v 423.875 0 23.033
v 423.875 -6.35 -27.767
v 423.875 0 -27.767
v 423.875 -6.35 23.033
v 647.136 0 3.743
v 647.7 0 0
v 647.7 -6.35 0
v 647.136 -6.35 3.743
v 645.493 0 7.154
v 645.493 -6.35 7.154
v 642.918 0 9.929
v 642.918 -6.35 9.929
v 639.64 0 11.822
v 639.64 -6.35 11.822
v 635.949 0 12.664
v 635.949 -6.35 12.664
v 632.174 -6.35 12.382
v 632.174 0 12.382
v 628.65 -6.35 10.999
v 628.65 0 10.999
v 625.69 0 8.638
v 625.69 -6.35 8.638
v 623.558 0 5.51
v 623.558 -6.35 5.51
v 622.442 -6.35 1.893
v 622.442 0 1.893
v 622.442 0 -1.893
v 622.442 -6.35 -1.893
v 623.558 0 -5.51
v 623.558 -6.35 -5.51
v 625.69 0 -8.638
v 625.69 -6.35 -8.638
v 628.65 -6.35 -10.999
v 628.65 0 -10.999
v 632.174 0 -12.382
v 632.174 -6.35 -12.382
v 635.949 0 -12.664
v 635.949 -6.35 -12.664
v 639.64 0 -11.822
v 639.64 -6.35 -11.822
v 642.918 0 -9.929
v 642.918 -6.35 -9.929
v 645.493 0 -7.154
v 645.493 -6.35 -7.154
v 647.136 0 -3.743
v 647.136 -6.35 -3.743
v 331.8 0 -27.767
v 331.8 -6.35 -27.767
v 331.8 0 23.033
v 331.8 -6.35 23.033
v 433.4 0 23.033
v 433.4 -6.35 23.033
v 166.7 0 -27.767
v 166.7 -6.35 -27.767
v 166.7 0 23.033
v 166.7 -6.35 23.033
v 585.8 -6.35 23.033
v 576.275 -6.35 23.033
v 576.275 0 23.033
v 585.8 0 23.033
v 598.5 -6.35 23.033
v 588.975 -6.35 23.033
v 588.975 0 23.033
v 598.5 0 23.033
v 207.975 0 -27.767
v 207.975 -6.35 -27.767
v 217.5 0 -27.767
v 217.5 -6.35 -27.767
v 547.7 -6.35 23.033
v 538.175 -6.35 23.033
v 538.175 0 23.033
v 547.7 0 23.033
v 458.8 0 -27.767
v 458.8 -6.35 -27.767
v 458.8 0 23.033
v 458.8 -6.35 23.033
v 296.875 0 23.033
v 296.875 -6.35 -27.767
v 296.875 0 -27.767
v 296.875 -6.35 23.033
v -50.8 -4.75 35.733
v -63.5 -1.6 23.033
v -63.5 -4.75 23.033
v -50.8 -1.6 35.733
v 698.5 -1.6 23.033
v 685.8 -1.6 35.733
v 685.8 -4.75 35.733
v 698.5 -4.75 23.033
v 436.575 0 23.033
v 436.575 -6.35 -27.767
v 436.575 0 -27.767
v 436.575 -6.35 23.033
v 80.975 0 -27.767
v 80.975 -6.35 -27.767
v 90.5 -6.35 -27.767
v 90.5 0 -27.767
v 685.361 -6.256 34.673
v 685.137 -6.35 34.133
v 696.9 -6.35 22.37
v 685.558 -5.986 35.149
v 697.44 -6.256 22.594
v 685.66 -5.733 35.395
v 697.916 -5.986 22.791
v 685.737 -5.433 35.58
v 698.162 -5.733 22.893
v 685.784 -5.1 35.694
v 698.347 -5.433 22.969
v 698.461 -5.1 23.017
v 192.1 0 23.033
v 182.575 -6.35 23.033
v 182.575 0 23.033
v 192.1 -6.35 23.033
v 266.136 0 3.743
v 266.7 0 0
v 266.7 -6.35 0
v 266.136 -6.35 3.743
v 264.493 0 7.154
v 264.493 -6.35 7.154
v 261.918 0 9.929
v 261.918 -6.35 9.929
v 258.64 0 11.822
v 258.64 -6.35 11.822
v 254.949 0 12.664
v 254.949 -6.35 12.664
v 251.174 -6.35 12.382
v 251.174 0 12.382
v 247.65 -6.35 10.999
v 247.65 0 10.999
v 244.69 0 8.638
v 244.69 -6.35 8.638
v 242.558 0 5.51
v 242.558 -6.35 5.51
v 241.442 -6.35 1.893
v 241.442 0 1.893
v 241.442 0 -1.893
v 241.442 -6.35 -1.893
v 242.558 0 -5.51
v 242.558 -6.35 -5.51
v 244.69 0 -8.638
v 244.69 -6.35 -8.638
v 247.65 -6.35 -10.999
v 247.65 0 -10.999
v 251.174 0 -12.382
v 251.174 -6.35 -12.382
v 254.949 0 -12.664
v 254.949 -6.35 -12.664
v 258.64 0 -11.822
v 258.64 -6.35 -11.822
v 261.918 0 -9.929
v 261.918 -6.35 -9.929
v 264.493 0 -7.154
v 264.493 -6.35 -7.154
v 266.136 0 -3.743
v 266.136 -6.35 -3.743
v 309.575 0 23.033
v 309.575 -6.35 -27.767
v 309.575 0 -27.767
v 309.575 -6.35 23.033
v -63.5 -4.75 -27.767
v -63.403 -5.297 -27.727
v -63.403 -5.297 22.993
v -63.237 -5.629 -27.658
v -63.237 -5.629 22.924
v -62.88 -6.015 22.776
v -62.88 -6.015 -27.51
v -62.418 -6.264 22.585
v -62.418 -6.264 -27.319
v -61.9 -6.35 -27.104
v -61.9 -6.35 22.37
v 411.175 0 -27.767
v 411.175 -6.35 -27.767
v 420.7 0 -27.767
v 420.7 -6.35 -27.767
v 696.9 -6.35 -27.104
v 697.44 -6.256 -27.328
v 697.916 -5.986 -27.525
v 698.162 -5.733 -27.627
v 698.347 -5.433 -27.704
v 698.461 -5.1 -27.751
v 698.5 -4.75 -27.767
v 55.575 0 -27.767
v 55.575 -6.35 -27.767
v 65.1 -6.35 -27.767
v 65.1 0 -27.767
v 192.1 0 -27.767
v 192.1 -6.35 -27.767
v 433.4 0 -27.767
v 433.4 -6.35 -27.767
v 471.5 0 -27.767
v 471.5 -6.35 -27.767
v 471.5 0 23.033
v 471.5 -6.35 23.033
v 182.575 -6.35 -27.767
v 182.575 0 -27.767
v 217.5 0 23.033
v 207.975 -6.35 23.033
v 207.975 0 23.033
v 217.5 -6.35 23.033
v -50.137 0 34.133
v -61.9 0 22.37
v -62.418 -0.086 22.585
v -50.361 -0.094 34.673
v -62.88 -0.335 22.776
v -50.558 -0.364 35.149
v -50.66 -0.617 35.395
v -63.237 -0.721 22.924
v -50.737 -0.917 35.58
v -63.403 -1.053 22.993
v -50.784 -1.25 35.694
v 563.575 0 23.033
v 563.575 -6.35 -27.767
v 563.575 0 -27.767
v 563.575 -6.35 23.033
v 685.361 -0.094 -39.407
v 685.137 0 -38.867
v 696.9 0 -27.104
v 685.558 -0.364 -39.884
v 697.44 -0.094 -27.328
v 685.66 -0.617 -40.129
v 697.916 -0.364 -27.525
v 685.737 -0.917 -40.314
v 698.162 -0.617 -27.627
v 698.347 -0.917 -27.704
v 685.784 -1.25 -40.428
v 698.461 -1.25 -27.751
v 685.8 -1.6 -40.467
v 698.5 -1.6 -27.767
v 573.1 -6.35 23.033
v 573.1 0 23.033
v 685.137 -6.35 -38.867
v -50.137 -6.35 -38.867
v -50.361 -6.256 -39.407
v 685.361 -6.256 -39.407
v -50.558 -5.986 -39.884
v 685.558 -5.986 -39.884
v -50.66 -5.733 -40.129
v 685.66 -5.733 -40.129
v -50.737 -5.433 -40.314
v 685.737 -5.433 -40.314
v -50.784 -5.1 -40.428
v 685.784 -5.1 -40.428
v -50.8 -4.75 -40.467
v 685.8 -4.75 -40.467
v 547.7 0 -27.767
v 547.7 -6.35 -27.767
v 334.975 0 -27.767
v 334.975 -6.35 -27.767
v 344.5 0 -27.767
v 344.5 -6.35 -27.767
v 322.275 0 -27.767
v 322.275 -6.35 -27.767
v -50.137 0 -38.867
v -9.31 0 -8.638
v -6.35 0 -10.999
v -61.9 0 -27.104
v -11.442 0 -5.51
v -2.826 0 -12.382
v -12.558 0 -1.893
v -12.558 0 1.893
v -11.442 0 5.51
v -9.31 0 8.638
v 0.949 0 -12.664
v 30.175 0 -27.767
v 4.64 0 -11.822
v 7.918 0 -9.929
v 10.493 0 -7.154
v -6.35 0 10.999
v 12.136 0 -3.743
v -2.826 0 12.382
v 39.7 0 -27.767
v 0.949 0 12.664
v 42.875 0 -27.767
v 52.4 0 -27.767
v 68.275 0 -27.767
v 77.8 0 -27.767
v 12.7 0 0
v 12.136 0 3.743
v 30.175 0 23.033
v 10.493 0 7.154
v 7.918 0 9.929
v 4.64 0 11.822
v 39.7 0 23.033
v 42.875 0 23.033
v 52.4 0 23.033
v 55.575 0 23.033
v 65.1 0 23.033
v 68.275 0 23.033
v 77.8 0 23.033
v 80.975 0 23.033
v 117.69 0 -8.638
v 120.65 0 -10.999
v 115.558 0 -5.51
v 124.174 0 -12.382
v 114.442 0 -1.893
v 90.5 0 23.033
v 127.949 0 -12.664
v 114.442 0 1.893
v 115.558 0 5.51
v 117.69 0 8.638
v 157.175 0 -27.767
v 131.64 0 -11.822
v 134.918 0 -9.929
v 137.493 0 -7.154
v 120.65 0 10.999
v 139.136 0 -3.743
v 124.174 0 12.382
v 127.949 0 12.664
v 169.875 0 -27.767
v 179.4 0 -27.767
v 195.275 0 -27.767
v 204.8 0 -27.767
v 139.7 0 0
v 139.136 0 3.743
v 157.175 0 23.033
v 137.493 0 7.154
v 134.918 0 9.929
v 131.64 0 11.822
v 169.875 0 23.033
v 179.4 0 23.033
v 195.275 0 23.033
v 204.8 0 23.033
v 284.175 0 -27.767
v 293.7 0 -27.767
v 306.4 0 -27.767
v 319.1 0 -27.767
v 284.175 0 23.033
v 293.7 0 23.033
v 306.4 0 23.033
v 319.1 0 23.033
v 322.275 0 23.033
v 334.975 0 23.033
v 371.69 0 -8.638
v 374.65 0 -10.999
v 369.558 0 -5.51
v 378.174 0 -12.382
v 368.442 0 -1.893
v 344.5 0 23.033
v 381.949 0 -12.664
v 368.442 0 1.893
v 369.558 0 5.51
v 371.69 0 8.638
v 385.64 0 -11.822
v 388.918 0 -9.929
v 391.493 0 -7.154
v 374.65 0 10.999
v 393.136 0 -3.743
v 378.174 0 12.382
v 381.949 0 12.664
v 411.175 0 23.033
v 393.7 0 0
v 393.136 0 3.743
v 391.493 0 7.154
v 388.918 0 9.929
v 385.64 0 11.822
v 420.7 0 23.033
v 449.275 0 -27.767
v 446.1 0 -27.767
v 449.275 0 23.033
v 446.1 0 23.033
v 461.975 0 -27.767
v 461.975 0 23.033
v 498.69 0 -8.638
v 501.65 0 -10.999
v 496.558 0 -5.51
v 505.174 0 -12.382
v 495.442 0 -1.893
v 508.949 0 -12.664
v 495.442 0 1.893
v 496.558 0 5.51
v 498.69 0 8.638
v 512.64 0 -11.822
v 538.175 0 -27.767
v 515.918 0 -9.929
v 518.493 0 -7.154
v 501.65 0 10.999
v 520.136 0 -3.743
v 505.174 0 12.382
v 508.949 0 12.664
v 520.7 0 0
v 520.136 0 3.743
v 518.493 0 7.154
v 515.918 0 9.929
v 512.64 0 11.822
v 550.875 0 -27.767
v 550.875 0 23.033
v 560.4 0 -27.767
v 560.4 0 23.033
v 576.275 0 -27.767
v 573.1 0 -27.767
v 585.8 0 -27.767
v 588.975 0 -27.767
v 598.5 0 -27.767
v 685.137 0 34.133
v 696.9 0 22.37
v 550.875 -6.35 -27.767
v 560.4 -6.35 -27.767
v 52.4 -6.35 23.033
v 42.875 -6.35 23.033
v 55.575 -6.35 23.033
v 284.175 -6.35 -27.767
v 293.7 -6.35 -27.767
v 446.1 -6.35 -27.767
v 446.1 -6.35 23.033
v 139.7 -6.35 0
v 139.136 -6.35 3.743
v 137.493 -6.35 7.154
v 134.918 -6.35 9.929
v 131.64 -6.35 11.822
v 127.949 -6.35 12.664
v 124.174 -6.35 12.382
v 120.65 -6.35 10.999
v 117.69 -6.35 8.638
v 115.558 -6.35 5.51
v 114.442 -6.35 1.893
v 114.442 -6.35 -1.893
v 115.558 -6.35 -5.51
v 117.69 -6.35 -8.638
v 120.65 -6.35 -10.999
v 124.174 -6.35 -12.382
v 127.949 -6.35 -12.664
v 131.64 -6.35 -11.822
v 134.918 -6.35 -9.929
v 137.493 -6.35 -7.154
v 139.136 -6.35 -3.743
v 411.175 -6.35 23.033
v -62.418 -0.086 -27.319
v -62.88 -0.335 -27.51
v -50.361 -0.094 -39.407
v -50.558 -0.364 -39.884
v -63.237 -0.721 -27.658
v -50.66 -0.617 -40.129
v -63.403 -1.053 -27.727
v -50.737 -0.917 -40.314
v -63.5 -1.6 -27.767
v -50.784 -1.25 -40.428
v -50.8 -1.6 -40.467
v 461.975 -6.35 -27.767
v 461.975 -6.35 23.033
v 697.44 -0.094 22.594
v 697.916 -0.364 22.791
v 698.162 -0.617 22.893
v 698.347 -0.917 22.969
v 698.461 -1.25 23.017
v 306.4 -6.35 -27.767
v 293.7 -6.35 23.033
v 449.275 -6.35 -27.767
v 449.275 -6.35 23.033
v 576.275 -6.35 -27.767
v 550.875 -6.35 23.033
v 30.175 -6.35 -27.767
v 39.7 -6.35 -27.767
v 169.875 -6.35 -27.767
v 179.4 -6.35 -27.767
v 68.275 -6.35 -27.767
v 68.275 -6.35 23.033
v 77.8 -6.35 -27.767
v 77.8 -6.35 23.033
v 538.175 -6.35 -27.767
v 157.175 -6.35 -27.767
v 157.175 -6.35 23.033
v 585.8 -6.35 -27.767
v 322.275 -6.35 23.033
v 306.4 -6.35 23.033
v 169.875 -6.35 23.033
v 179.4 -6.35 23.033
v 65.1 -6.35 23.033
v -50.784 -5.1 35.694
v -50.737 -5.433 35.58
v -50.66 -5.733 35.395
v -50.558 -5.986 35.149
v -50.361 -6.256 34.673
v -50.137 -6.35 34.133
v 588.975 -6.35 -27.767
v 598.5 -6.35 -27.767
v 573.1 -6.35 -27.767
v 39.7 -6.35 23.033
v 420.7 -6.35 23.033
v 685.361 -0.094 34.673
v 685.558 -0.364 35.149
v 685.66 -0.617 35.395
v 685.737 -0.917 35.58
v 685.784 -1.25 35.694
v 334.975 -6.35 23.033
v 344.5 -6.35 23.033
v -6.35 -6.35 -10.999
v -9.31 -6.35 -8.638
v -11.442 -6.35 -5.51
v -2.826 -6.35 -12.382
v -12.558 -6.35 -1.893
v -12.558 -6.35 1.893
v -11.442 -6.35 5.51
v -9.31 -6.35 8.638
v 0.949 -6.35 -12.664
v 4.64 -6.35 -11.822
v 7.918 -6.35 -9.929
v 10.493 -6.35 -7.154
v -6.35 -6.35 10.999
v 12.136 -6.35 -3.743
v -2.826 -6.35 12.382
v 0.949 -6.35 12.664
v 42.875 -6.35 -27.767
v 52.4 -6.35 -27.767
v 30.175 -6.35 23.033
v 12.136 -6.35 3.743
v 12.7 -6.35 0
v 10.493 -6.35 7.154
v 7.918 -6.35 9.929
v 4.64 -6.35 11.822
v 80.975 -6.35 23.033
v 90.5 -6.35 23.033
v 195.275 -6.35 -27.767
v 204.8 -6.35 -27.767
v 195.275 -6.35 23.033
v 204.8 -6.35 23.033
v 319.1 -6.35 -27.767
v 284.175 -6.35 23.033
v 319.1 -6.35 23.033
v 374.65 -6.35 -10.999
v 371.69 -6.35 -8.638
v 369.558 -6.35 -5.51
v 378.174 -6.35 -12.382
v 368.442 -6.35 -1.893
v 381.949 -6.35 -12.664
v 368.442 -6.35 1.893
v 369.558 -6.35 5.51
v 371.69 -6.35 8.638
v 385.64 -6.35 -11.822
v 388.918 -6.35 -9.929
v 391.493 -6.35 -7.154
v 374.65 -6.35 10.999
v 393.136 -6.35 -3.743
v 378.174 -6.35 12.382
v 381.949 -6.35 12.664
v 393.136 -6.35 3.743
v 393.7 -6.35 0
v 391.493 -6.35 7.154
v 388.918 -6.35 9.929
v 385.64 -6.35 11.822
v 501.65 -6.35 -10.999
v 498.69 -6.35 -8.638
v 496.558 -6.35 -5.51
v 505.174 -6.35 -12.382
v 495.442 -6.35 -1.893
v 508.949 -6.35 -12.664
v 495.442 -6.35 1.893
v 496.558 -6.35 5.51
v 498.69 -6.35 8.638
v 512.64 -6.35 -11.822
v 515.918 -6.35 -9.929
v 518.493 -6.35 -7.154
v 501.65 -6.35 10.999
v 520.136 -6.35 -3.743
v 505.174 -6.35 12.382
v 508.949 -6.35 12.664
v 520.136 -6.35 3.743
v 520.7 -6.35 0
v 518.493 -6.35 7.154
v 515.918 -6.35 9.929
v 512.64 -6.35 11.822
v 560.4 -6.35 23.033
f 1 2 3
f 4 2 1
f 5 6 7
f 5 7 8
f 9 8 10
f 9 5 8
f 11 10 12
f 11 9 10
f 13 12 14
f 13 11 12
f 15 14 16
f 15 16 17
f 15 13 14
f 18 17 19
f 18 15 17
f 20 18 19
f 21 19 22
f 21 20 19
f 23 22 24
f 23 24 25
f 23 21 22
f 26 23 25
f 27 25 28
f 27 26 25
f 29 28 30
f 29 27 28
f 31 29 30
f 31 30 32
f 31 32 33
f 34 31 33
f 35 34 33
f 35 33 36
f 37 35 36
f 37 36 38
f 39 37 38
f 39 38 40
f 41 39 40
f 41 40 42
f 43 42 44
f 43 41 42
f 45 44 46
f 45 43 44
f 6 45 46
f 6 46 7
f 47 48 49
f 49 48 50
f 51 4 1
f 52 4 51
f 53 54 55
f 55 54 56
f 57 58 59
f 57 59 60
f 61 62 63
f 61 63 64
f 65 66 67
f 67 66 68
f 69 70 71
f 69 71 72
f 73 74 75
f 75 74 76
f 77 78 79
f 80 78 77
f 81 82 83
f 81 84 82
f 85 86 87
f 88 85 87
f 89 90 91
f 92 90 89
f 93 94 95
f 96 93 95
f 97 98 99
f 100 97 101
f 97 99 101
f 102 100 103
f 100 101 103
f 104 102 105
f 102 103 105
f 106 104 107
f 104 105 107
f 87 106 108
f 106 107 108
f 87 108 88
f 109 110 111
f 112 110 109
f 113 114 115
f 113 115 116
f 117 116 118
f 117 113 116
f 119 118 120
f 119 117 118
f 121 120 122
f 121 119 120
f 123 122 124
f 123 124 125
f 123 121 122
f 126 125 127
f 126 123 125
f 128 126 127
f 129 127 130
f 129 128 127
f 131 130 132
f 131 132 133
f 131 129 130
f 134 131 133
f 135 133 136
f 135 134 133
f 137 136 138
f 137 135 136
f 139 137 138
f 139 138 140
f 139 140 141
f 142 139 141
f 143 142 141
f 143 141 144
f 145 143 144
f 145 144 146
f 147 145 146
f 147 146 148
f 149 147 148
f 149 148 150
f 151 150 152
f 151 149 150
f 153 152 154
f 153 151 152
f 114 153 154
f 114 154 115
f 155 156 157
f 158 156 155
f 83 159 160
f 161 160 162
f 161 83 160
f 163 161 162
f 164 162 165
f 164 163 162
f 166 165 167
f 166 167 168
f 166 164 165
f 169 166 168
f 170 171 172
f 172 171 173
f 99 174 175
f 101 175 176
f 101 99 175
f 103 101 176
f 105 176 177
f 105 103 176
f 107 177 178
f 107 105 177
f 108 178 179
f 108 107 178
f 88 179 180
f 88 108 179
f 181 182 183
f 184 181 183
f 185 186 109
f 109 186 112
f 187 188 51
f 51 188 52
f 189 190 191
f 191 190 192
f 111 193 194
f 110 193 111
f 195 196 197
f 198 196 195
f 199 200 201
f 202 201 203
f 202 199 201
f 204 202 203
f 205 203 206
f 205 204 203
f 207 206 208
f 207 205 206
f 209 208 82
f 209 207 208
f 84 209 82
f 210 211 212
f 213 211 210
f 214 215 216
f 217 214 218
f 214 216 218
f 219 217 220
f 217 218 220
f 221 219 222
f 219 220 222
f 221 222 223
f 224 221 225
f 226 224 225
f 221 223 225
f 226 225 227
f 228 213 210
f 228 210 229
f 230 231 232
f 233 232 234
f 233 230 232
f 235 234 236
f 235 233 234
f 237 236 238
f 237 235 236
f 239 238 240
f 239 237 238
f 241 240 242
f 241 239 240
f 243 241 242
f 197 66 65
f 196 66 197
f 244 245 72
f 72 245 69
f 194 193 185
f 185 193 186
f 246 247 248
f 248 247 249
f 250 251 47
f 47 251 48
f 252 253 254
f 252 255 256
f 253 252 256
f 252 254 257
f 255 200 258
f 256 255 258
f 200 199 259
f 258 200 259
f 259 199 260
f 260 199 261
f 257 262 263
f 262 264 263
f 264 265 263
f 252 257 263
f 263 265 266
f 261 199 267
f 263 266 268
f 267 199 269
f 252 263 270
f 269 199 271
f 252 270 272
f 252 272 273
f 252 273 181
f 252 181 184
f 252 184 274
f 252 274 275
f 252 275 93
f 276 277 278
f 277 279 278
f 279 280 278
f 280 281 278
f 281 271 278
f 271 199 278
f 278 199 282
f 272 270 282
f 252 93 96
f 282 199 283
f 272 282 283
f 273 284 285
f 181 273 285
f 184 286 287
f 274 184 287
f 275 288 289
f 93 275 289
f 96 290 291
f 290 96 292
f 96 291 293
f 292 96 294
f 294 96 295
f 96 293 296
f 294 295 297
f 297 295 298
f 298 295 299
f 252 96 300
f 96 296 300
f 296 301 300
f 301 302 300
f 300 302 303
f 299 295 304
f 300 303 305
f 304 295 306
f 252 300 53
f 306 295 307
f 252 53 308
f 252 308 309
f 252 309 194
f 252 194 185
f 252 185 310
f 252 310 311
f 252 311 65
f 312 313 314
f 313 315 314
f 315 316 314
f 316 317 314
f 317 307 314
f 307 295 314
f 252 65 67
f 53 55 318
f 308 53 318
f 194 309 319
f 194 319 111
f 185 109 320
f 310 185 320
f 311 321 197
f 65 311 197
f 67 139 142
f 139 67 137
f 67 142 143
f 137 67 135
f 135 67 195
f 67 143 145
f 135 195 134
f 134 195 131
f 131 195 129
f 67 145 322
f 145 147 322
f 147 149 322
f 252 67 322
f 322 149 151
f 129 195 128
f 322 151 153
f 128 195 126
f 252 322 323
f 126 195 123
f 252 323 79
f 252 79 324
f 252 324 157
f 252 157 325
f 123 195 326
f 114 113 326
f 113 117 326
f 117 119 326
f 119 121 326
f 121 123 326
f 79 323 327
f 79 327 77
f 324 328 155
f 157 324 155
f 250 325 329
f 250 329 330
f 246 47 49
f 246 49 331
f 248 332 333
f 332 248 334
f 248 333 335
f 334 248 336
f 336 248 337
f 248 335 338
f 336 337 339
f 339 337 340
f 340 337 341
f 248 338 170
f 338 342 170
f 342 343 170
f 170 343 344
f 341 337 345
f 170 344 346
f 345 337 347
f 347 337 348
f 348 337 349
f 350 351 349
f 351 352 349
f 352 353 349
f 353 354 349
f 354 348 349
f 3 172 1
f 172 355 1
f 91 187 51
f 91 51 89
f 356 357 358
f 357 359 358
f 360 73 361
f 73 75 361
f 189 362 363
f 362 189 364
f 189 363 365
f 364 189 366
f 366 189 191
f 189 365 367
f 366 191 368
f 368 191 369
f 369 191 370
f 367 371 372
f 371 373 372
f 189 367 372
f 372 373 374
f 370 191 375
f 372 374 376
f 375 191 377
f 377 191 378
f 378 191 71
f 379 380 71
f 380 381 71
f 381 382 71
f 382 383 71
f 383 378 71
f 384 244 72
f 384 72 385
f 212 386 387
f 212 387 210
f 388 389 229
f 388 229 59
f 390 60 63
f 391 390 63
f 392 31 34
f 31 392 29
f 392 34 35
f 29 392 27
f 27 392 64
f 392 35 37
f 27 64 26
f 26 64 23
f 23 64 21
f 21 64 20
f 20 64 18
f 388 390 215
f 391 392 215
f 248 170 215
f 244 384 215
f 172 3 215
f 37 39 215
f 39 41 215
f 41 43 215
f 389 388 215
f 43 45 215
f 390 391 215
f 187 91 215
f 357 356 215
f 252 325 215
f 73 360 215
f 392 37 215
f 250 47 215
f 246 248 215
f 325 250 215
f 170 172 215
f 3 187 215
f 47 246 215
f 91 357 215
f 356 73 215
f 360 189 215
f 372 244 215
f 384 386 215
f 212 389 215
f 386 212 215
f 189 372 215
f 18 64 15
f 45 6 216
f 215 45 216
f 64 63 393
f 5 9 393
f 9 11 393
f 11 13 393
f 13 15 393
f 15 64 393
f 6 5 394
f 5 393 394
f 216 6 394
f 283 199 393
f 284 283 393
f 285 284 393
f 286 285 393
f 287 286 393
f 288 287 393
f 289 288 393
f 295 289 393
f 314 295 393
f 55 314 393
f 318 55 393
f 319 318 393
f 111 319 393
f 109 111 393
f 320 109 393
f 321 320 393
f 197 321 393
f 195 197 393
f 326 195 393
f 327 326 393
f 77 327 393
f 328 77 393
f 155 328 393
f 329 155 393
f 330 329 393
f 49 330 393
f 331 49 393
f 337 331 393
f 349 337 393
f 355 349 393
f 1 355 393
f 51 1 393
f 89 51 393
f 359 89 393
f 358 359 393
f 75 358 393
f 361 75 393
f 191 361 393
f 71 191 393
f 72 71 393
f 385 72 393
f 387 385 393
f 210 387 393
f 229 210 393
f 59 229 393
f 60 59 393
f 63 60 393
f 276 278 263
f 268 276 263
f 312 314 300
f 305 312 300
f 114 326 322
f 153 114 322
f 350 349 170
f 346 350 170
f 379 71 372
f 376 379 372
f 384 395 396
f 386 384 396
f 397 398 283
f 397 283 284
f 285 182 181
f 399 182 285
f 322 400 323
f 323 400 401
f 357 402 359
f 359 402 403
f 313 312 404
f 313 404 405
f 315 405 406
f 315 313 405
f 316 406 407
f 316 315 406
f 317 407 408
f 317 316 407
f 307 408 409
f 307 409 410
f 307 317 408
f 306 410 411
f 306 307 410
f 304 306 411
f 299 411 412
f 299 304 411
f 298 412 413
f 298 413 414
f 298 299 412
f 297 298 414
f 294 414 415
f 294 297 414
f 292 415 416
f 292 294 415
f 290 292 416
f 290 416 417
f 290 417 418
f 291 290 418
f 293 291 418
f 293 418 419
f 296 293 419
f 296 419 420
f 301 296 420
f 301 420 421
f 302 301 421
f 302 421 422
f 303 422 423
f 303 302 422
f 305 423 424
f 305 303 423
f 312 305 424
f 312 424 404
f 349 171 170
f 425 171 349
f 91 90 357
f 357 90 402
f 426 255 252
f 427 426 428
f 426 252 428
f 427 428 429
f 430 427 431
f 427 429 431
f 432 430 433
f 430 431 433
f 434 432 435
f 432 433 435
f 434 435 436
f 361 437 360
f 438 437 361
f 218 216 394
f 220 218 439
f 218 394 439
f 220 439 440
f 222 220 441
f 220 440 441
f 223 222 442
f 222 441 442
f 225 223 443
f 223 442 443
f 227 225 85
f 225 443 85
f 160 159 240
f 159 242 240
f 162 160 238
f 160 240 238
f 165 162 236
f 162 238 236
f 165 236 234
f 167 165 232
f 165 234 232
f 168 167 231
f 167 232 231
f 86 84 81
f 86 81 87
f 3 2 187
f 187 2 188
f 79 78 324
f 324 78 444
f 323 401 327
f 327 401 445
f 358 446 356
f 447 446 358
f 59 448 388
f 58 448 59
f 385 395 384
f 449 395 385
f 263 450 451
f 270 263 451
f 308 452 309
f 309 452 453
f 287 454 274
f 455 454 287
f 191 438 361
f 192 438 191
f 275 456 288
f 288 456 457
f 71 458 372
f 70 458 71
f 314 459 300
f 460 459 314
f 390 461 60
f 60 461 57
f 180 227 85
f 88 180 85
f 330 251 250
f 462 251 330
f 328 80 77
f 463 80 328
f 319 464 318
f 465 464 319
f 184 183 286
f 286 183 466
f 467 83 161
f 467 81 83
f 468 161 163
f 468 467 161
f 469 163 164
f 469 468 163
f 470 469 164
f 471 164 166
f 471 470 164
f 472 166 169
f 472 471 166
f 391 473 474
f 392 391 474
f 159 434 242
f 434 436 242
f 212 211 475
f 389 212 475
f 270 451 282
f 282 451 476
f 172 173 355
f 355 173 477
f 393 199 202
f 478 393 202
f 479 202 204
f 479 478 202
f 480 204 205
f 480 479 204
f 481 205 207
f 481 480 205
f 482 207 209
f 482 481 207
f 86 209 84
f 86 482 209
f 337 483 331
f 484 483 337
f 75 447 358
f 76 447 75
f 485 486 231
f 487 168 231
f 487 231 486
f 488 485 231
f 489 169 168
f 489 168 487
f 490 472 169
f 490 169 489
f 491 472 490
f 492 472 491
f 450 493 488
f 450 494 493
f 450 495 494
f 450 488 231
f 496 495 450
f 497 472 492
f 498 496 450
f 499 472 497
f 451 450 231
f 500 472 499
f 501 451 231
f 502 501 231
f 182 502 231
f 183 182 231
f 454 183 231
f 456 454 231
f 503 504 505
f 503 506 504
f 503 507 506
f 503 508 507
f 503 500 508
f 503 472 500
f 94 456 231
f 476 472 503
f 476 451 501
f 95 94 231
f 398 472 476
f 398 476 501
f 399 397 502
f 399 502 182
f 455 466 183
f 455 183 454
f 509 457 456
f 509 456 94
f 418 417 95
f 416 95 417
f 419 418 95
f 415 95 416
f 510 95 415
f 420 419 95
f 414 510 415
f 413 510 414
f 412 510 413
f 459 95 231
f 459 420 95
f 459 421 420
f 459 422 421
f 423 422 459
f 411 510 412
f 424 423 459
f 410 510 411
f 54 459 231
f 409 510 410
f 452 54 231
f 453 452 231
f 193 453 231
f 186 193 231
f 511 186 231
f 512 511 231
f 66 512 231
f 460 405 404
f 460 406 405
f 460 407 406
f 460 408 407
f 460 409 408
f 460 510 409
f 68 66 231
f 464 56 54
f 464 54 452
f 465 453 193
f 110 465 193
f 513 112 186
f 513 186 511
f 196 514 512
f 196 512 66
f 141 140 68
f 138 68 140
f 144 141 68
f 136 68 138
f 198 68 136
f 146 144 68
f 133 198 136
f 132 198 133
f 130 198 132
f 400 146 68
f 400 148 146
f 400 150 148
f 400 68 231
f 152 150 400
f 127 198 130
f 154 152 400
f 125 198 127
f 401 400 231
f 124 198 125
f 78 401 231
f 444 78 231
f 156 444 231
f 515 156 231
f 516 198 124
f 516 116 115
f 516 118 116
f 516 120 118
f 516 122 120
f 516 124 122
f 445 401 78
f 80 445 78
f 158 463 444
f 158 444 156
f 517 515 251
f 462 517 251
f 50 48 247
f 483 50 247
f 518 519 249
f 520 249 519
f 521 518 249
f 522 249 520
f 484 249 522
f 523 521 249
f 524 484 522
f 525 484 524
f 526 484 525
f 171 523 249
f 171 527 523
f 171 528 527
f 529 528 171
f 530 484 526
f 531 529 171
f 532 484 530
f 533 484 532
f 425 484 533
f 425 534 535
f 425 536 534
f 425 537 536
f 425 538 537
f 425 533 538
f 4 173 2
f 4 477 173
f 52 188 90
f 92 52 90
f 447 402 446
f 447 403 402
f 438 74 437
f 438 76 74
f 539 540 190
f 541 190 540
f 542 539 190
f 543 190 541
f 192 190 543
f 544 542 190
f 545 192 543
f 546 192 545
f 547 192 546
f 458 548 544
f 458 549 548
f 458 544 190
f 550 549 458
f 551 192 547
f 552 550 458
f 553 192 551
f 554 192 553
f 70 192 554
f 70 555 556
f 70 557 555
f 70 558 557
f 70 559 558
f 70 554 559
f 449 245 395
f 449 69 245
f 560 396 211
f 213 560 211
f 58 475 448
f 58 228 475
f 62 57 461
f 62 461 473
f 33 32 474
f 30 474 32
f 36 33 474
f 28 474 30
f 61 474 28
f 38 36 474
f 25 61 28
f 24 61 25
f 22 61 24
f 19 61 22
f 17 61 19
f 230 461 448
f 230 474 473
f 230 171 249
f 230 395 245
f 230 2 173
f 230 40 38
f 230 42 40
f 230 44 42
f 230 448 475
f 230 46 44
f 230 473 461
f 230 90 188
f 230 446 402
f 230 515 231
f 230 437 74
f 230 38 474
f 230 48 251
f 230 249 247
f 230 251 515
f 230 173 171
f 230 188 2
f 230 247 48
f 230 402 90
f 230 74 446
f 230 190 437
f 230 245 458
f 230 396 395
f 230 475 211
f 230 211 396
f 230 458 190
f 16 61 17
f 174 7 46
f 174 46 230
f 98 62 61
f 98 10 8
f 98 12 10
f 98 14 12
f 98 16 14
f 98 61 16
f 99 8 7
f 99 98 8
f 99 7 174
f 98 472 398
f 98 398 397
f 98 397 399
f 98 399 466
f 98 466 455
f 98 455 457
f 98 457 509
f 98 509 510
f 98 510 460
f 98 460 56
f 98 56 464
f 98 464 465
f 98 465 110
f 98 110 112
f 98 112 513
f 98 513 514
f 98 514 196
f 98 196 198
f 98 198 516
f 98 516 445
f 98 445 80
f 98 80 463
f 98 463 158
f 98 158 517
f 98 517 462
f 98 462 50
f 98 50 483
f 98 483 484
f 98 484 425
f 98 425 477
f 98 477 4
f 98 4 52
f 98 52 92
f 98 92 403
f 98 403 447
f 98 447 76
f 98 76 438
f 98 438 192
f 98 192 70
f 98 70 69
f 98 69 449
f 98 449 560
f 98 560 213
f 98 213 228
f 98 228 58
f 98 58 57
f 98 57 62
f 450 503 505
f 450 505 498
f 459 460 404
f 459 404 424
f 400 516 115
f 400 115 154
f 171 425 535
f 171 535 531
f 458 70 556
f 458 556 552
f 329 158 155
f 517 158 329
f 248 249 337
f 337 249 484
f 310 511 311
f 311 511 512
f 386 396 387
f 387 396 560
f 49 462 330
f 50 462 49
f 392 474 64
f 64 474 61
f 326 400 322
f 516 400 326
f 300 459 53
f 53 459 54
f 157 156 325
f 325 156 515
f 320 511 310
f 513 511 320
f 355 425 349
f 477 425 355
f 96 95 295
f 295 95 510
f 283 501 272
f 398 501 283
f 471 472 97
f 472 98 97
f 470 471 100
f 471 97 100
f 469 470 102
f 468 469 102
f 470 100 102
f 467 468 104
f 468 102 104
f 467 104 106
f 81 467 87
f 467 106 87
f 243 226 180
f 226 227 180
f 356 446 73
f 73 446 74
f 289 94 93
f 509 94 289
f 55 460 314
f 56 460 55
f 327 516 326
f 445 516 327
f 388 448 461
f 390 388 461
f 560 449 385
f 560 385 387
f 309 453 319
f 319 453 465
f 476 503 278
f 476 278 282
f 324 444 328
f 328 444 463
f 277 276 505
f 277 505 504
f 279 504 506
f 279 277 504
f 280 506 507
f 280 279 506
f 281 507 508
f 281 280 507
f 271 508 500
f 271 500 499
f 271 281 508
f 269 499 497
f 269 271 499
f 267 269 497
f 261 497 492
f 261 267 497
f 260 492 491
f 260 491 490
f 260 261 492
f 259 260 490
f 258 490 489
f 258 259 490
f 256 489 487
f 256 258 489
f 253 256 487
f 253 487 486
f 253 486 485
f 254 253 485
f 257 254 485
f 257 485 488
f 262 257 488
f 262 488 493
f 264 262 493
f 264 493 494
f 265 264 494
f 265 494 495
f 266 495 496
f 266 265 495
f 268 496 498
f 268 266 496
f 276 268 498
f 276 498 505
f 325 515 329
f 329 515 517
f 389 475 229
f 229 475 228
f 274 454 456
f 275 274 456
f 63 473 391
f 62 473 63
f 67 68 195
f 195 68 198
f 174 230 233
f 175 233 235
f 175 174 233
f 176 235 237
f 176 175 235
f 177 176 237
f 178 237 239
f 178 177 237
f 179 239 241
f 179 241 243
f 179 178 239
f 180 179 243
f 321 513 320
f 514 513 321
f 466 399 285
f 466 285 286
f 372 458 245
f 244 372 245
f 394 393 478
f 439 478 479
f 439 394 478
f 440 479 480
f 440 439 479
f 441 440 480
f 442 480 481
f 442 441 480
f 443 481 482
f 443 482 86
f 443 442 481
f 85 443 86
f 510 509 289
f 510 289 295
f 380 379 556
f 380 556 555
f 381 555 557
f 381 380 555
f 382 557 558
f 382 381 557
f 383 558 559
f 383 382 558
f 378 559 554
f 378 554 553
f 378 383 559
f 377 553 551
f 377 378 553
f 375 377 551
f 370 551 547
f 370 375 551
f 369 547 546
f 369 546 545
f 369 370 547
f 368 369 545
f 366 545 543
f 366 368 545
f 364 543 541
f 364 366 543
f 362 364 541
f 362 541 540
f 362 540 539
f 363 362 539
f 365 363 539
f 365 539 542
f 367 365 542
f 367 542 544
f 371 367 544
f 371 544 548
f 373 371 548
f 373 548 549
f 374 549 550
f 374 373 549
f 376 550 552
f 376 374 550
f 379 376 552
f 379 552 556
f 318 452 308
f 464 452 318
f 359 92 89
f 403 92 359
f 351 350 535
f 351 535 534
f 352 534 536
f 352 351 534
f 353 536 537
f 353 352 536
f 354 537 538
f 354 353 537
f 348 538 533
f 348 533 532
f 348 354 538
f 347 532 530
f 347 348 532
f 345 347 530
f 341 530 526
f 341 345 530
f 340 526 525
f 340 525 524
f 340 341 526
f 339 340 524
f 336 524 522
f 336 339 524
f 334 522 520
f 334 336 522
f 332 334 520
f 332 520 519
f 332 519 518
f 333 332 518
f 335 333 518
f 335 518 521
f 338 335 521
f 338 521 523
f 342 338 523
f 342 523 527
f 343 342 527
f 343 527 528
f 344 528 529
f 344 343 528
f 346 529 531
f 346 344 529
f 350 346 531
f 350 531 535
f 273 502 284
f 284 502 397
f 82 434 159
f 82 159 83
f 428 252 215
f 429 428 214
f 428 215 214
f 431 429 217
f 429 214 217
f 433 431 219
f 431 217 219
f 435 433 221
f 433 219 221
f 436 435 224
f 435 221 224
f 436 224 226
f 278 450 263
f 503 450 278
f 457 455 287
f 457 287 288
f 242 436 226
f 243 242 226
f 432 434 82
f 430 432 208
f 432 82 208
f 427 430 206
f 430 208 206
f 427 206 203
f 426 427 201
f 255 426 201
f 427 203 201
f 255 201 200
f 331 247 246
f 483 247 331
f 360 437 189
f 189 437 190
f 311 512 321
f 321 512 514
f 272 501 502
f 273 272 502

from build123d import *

# Parameters (mm, degrees)
F0_W     = 762
F0_H     = 76.2
F0_R     = 12.7
F1_DEPTH = 6.35
F2_W     = 9.525
F2_H     = 50.8
F3_DEPTH = 6.351
F4_SIZE  = 12.7
F5_R     = 1.6002


with BuildPart() as f1:
    # F0 (on Front) → F1 (new body)
    with BuildSketch(Plane.XZ):
        with Locations((317.5, -2.3671598174)):
            Rectangle(F0_W, F0_H)
        Circle(F0_R, mode=Mode.SUBTRACT)
        with Locations((127, 0)):
            Circle(F0_R, mode=Mode.SUBTRACT)
        with Locations((254, 0)):
            Circle(F0_R, mode=Mode.SUBTRACT)
        with Locations((381, 0)):
            Circle(F0_R, mode=Mode.SUBTRACT)
        with Locations((508, 0)):
            Circle(F0_R, mode=Mode.SUBTRACT)
        with Locations((635, 0)):
            Circle(F0_R, mode=Mode.SUBTRACT)
    extrude(amount=F1_DEPTH)

    # F2 (on face) → F3 (cut, through all)
    with BuildSketch(Plane.XZ.offset(6.35)):
        with Locations((34.9377, -2.3671598174)):
            Rectangle(F2_W, F2_H)
        with Locations((47.6377, -2.3671598174)):
            Rectangle(F2_W, F2_H)
        with Locations((60.3377, -2.3671598174)):
            Rectangle(F2_W, F2_H)
        with Locations((73.0377, -2.3671598174)):
            Rectangle(F2_W, F2_H)
        with Locations((85.7377, -2.3671598174)):
            Rectangle(F2_W, F2_H)
        with Locations((161.9377, -2.3671598174)):
            Rectangle(F2_W, F2_H)
        with Locations((174.6377, -2.3671598174)):
            Rectangle(F2_W, F2_H)
        with Locations((187.3377, -2.3671598174)):
            Rectangle(F2_W, F2_H)
        with Locations((200.0377, -2.3671598174)):
            Rectangle(F2_W, F2_H)
        with Locations((212.7377, -2.3671598174)):
            Rectangle(F2_W, F2_H)
        with Locations((288.9377, -2.3671598174)):
            Rectangle(F2_W, F2_H)
        with Locations((301.6377, -2.3671598174)):
            Rectangle(F2_W, F2_H)
        with Locations((314.3377, -2.3671598174)):
            Rectangle(F2_W, F2_H)
        with Locations((327.0377, -2.3671598174)):
            Rectangle(F2_W, F2_H)
        with Locations((339.7377, -2.3671598174)):
            Rectangle(F2_W, F2_H)
        with Locations((415.9377, -2.3671598174)):
            Rectangle(F2_W, F2_H)
        with Locations((428.6377, -2.3671598174)):
            Rectangle(F2_W, F2_H)
        with Locations((441.3377, -2.3671598174)):
            Rectangle(F2_W, F2_H)
        with Locations((454.0377, -2.3671598174)):
            Rectangle(F2_W, F2_H)
        with Locations((466.7377, -2.3671598174)):
            Rectangle(F2_W, F2_H)
        with Locations((542.9377, -2.3671598174)):
            Rectangle(F2_W, F2_H)
        with Locations((555.6377, -2.3671598174)):
            Rectangle(F2_W, F2_H)
        with Locations((568.3377, -2.3671598174)):
            Rectangle(F2_W, F2_H)
        with Locations((581.0377, -2.3671598174)):
            Rectangle(F2_W, F2_H)
        with Locations((593.7377, -2.3671598174)):
            Rectangle(F2_W, F2_H)
    extrude(amount=-F3_DEPTH, mode=Mode.SUBTRACT)

    # F4
    f4_edges = [f1.edges().sort_by_distance(p)[0] for p in [
        (-63.5, -3.175, 35.73284),
        (-63.5, -3.175, -40.46716),
        (698.5, -3.175, 35.73284),
        (698.5, -3.175, -40.46716),
    ]]
    chamfer(f4_edges, length=F4_SIZE)

    # F5
    f5_edges = [f1.edges().sort_by_distance(p)[0] for p in [
        (317.5, -6.35, 35.73284),
        (317.5, 0, 35.73284),
        (317.5, -6.35, -40.46716),
        (317.5, 0, -40.46716),
        (-63.5, -6.35, -2.36716),
        (-63.5, 0, -2.36716),
        (698.5, -6.35, -2.36716),
        (698.5, 0, -2.36716),
        (-57.15, -6.35, -34.11716),
        (-57.15, 0, -34.11716),
        (692.15, -6.35, 29.38284),
        (692.15, 0, 29.38284),
        (692.15, -6.35, -34.11716),
        (692.15, 0, -34.11716),
        (-57.15, -6.35, 29.38284),
        (-57.15, 0, 29.38284),
    ]]
    fillet(f5_edges, radius=F5_R)


solid = f1.part
